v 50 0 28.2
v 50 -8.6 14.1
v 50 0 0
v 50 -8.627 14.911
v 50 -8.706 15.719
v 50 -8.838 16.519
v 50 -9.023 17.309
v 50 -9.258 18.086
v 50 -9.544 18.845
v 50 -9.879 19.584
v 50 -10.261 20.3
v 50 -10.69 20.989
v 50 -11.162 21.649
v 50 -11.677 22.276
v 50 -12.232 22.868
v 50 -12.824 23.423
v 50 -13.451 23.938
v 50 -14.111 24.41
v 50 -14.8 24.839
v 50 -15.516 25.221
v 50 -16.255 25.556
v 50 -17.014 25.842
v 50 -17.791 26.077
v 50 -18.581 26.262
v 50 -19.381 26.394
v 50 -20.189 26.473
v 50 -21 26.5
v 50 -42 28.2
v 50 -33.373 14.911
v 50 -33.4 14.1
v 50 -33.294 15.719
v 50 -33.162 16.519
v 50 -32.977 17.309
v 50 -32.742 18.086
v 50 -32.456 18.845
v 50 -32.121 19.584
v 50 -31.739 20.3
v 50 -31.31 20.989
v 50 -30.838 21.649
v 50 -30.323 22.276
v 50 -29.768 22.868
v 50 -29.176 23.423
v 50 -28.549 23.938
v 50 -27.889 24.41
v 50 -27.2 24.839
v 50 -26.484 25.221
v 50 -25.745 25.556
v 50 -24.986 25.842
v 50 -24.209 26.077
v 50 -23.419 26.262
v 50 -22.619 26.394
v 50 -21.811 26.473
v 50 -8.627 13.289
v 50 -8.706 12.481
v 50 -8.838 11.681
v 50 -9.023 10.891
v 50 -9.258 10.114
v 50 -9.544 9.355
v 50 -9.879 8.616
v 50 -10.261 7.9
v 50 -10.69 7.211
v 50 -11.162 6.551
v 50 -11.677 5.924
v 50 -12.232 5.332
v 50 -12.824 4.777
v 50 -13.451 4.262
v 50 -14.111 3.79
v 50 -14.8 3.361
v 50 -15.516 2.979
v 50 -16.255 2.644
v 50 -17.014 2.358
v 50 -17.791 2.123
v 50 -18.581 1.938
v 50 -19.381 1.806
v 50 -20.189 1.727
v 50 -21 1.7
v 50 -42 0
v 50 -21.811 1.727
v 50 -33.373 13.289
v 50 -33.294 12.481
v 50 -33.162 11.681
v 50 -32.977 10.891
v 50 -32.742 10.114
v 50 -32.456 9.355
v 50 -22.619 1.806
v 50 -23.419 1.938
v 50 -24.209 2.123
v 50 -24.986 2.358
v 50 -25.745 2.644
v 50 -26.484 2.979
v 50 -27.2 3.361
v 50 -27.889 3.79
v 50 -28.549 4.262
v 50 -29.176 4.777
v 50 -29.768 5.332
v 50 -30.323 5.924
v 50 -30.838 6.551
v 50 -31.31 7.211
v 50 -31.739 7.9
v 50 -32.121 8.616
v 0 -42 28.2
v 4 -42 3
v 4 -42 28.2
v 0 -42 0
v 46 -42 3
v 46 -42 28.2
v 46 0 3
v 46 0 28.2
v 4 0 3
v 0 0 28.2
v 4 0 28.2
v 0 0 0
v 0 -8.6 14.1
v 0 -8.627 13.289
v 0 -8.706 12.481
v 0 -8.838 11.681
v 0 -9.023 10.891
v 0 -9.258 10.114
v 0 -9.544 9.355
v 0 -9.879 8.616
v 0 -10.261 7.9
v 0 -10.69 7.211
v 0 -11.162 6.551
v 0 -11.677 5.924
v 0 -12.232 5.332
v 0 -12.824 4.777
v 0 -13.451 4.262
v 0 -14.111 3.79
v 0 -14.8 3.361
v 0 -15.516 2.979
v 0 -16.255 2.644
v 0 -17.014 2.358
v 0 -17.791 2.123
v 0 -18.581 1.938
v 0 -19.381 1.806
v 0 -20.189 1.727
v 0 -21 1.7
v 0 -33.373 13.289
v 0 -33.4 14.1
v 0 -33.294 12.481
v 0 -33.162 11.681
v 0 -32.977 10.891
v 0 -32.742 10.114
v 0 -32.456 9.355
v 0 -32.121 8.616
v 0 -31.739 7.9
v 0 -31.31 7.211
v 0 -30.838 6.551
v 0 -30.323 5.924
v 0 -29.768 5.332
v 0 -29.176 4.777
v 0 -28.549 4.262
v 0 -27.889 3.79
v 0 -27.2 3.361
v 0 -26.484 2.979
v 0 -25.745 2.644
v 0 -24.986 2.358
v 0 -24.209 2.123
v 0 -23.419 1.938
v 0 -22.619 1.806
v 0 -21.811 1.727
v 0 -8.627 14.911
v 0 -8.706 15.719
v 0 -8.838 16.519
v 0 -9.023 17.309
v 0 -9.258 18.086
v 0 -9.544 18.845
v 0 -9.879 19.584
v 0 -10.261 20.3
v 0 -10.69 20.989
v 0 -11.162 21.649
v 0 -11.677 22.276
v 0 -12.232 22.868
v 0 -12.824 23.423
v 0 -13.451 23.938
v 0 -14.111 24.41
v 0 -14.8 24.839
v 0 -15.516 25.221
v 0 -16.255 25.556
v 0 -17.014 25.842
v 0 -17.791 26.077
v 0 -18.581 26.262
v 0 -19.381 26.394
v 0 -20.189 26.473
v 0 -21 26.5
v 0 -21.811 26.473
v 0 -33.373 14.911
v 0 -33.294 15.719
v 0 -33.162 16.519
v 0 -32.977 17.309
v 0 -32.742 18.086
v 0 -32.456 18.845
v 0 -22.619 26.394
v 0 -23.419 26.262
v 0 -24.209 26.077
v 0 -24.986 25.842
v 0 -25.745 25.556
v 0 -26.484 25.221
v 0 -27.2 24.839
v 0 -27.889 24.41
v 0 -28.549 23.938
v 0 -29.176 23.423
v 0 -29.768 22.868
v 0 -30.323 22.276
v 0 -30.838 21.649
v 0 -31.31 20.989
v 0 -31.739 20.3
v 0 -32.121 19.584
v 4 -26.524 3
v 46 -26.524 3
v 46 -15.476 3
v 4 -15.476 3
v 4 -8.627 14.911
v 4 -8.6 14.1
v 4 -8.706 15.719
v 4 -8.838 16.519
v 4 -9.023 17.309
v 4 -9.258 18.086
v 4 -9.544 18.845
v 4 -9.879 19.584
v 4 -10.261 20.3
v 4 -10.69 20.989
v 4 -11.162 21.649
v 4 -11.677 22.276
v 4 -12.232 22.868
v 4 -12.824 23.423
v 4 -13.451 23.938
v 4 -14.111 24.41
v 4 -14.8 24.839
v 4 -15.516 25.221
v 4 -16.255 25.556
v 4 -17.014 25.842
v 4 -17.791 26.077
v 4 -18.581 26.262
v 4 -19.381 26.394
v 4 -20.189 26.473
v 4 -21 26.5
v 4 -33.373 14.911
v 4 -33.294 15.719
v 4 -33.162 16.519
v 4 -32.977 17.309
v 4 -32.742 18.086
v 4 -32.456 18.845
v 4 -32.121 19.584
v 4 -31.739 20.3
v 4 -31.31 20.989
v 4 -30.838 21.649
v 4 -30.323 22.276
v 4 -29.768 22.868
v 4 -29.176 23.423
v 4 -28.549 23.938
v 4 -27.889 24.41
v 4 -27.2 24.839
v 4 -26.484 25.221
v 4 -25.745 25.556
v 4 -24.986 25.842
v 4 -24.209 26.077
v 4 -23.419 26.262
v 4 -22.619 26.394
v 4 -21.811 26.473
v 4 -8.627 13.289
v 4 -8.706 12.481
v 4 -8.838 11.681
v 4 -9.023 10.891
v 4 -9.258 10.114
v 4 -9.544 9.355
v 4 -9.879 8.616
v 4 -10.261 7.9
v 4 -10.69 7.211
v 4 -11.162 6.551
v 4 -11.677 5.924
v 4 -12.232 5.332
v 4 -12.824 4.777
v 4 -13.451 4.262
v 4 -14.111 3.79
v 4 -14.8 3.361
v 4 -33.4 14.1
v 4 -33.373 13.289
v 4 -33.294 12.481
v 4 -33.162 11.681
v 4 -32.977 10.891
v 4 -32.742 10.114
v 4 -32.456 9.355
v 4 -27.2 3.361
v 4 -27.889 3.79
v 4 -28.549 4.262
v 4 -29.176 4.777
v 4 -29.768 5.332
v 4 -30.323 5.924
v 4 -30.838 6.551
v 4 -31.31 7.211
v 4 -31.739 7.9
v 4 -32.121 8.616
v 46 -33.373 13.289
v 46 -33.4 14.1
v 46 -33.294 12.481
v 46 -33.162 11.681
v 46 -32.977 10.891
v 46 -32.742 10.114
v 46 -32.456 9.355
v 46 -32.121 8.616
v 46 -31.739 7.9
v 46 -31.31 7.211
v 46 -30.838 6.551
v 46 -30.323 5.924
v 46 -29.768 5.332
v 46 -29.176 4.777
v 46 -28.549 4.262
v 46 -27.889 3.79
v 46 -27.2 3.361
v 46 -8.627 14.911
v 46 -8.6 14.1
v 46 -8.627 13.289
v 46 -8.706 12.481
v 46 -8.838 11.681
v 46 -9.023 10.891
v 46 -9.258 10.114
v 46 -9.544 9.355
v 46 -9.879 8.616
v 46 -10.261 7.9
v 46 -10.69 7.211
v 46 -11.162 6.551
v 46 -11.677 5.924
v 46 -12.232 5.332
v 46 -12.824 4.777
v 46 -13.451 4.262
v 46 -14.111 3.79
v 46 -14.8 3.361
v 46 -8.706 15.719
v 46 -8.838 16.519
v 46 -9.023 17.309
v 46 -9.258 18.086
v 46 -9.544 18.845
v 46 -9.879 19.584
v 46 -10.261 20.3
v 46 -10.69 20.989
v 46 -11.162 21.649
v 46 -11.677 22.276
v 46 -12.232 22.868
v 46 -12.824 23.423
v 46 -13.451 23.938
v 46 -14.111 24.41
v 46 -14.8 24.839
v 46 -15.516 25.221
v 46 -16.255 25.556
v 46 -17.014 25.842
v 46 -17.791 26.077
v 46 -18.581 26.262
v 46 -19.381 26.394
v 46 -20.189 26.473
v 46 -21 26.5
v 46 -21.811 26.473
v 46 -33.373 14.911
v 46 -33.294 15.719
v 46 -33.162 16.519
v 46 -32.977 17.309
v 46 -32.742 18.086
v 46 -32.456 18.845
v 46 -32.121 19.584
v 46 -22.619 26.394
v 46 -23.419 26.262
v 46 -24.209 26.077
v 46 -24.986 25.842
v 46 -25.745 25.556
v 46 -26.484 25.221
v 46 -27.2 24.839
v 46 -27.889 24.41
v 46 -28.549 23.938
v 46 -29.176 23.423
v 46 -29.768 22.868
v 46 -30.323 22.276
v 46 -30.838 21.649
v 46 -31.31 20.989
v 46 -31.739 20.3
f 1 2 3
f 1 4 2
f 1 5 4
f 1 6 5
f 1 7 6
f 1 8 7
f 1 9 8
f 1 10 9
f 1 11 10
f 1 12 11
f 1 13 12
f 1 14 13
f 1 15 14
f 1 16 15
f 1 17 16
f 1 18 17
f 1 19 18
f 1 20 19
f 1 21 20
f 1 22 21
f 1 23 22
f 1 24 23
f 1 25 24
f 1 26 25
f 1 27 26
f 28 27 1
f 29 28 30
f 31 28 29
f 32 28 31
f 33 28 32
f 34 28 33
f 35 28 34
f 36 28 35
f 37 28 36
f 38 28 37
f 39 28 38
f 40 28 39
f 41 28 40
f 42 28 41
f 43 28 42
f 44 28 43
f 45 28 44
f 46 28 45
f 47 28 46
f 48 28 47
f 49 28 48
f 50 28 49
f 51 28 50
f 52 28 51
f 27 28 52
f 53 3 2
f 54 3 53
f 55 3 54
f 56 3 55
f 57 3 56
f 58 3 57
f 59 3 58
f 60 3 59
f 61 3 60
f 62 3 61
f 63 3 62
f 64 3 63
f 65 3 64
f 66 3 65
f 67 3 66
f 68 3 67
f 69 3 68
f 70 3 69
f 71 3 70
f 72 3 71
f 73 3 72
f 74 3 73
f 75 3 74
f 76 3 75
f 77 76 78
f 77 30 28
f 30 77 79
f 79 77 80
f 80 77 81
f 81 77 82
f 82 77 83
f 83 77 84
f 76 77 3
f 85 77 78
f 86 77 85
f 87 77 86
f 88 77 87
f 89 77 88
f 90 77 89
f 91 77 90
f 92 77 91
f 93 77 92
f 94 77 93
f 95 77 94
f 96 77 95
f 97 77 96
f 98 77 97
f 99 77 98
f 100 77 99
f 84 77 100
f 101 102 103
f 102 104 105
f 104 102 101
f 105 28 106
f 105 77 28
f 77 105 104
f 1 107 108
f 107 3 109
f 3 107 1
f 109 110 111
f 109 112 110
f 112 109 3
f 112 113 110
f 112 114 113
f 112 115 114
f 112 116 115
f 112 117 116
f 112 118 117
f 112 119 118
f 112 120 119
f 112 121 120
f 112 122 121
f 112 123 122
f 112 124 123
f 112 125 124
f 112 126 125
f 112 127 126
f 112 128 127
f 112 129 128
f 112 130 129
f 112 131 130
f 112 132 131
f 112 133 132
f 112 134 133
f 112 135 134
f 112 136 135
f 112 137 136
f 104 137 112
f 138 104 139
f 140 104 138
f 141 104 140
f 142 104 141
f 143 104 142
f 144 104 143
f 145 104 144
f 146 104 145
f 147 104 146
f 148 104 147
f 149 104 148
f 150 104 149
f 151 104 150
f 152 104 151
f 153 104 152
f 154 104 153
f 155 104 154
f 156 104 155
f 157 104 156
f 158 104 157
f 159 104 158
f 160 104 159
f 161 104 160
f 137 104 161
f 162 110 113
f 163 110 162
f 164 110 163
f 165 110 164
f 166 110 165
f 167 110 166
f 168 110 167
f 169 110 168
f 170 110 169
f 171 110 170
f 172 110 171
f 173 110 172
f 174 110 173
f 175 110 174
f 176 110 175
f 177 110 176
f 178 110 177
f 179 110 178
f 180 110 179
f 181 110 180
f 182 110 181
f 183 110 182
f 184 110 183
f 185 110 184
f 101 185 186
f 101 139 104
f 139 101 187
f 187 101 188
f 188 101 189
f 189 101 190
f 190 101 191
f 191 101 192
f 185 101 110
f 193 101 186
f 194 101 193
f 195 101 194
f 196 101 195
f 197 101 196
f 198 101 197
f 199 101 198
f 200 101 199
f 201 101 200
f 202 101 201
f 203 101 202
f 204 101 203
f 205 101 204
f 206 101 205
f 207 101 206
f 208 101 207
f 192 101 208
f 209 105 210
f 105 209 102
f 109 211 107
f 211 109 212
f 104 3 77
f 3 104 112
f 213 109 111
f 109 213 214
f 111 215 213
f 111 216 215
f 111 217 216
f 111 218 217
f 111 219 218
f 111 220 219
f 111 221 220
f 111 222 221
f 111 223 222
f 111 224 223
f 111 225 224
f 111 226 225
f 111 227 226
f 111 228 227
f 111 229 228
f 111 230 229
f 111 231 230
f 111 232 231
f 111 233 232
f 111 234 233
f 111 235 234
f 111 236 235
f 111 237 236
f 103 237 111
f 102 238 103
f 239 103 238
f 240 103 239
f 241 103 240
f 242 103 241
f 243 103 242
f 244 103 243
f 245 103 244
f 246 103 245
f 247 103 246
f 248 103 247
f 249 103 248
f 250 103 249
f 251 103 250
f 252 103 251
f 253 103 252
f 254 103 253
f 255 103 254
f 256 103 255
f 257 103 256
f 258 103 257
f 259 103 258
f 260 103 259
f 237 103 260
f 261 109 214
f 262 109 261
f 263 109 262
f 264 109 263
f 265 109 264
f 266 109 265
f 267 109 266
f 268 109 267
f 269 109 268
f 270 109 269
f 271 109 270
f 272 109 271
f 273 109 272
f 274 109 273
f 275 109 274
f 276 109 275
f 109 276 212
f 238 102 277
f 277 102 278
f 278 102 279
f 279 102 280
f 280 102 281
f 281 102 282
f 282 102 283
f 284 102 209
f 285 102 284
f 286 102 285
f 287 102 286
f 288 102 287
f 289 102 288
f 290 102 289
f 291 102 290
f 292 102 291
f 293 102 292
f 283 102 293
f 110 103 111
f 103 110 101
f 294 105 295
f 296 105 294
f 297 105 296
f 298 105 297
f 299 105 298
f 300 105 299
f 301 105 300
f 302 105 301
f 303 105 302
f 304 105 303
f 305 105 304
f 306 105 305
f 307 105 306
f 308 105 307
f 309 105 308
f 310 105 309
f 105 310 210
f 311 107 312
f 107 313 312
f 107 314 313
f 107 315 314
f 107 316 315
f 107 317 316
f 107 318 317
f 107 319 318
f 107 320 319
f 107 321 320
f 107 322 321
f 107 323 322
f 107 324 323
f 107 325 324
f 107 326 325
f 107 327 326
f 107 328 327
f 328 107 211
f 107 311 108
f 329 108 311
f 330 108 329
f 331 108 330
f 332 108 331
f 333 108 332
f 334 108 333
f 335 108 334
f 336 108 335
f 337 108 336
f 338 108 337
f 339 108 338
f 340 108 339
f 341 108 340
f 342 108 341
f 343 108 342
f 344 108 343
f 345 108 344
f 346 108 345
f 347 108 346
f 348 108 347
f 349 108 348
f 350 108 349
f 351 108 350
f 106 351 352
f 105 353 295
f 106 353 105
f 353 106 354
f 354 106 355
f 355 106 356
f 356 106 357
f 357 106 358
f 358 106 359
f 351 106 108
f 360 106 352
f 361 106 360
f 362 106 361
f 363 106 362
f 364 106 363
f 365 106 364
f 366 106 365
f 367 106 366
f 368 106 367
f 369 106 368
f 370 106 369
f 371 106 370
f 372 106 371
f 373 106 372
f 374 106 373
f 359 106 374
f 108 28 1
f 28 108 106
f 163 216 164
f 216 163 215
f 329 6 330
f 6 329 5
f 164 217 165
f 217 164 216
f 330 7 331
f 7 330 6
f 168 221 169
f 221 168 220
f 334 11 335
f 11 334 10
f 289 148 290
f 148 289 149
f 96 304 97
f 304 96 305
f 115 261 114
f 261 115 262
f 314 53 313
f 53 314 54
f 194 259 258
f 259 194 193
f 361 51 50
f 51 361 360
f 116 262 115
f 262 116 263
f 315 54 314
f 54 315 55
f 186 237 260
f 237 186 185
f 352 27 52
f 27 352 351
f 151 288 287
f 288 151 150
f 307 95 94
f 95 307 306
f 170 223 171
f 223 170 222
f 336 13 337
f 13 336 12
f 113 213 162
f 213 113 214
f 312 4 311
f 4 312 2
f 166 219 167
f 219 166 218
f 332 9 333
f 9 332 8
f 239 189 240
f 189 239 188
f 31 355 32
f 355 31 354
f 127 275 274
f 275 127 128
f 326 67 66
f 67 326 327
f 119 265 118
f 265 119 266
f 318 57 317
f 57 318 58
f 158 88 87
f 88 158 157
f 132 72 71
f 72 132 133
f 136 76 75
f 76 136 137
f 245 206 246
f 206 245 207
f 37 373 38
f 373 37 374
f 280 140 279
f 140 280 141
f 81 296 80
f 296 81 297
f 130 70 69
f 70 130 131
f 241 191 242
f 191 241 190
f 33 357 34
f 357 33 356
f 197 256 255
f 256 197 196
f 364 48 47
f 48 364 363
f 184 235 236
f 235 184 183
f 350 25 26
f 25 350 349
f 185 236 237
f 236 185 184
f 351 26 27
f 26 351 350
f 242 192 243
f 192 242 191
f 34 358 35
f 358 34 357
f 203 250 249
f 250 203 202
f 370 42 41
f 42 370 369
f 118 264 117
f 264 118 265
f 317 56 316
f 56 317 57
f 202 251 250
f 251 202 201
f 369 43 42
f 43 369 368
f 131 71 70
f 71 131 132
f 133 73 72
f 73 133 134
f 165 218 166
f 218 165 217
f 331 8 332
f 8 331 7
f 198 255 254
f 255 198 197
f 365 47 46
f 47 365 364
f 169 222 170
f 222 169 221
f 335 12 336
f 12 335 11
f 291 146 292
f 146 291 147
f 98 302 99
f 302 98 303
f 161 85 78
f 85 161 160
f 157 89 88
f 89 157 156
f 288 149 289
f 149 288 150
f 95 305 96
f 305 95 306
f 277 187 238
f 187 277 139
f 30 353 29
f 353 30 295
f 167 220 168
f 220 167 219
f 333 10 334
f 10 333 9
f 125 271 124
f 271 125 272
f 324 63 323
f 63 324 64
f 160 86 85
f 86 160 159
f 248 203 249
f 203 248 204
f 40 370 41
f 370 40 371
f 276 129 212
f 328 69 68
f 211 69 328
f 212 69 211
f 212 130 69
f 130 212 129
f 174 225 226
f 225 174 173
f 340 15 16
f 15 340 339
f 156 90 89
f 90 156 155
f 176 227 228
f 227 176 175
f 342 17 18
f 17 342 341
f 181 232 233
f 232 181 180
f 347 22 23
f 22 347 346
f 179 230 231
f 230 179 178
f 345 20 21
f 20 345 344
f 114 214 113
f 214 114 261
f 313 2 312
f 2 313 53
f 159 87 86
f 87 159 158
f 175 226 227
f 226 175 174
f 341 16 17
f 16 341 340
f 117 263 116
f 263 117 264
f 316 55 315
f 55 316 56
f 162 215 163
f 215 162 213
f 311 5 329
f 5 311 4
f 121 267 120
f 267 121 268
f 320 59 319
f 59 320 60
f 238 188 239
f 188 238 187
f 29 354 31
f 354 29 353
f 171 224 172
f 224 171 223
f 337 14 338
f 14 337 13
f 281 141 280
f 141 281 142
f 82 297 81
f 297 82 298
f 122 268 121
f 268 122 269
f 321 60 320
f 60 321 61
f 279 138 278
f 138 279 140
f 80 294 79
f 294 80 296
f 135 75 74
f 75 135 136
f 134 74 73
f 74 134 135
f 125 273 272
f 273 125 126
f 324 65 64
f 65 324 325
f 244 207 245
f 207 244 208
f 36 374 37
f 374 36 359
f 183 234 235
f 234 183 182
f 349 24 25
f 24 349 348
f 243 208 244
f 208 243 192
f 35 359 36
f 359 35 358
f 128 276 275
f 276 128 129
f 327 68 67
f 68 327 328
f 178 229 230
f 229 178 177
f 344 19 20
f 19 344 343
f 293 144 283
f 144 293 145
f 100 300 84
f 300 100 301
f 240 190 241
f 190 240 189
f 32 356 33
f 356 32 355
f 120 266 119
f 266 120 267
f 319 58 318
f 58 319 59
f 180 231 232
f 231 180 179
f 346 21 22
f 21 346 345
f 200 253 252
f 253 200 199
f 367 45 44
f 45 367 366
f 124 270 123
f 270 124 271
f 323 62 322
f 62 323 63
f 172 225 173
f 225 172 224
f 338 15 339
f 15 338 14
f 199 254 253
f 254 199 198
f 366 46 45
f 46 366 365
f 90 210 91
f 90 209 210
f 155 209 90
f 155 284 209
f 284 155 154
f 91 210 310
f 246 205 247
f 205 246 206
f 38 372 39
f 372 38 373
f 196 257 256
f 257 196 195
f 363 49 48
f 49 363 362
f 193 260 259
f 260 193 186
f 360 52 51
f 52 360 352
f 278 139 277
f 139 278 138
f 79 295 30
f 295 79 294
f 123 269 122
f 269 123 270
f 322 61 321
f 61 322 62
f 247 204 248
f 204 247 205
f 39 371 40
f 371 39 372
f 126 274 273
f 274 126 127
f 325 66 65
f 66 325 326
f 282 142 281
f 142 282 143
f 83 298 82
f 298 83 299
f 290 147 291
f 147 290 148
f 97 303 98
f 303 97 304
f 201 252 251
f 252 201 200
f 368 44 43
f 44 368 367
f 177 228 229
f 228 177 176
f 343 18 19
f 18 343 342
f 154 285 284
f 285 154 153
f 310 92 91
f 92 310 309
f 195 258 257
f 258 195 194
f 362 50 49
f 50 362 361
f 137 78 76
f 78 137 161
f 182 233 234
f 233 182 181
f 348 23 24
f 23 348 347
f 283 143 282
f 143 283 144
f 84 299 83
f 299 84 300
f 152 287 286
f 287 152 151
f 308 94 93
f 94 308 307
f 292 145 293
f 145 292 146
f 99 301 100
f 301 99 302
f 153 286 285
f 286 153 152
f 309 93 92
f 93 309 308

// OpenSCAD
$fn = 96;

// Toggle the default view.
show_assembly = false;
show_print_layout = false;
show_base_only = false;
show_body_only = false;
show_cover_only = false;
show_roller_only = false;
show_roller_holder_short_only = true;

// Candy and printer assumptions.
candy_d = 15;
fit_clearance = 0.25;          // Friction-fit clearance per side for the cover plug.
rotating_clearance = 0.40;     // Radial running clearance around the roller.

// Overall envelope.
overall_w = 50;
overall_h = 200;

// Major parts.
base_t = 22;
cover_t = 8;
body_h = overall_h - base_t - cover_t;

// Body.
side_t = 4;
back_t = 3;
front_glue_land = 0;
body_w = overall_w;
roller_d = 24;
roller_r = roller_d / 2;
roller_gap_wall = 0.60;        // Gap from roller OD to back wall / future acrylic.
channel_d = roller_d + 2 * roller_gap_wall;
body_d = back_t + channel_d + front_glue_land;
inner_w = body_w - 2 * side_t;
acrylic_plane_y = body_d;

// Roller and scoop.
roller_handle_extension = 14;
roller_len = body_w + 2 * roller_handle_extension;
roller_hole_d = roller_d + 2 * rotating_clearance;
scoop_d = 16.5;
scoop_len = inner_w - 15.0;
scoop_center_lift = 4.5;       // Offsets the scoop upward to avoid a paper-thin shell.

// Vertical placement.
body_z = base_t;
roller_z = 150;
roller_y = body_d / 2;

// Slides.
slide_count = 5;
slide_t = 3;
slide_depth = channel_d - 2.0;
slide_margin = 8;
slide_length_scale = 0.9;
slide_run = (inner_w - slide_margin) * slide_length_scale;
slide_angle = 22;
slide_drop = slide_run * sin(slide_angle);
roller_to_slide_gap = 15;
slide_step_z = 21;
top_slide_high_z = (roller_z - roller_r - body_z) - roller_to_slide_gap - slide_t;
slide_anchor_z = [for (i = [0 : slide_count - 1]) top_slide_high_z - i * slide_step_z];

// Roller-holder-short part. This keeps the top body section with the roller
// through-hole centered vertically in the cropped printable part.
roller_holder_short_top_clearance = (body_h - (roller_z - body_z)) / 2;
roller_holder_short_roller_z = roller_holder_short_top_clearance;
roller_holder_short_h = 2 * roller_holder_short_top_clearance;

// Fifth slide discharge point. The last slide is the left slide, so candy exits near the right side.
last_slide_end_x = (side_t - 0.4) + slide_run * cos(slide_angle);

// Base.
base_front_margin = 30;
base_d = body_d + base_front_margin;
trough_w = overall_w - 2 * side_t - 4;
trough_l = 50;
trough_point_z = base_t - 15;
trough_x = (overall_w - trough_w) / 2;

// Cover plug.
cover_plug_h = 12;
cover_plug_w = inner_w - 2 * fit_clearance;
cover_plug_d = channel_d - 2 * fit_clearance;

module trough_prism_origin() {
    // Maps local polygon/extrude axes [u, v, w] to global [x, y, z] = [w, u, v].
    // That gives an X-axis prism from a Y-Z triangle.
    multmatrix([
        [0, 0, 1, 0],
        [1, 0, 0, 0],
        [0, 1, 0, 0],
        [0, 0, 0, 1]
    ])
        linear_extrude(height = trough_w)
        polygon(points = [
            [0, trough_point_z],
            [0, base_t],
            [trough_l, base_t]
        ]);
}

module base_plate() {
    color([0.96, 0.64, 0.05])
    difference() {
        cube([overall_w, base_d, base_t]);
        translate([trough_x, 0, 2])
            translate([trough_w / 2, trough_l / 2, (trough_point_z + base_t) / 2])
            rotate([180, 180, 0])
            translate([-trough_w / 2, -trough_l / 2, -(trough_point_z + base_t) / 2])
            trough_prism_origin();
    }
}

module cover_plate() {
    color([0.96, 0.64, 0.05])
    union() {
        cube([overall_w, body_d, cover_t]);

        // One-piece friction plug. 0.20 mm per side is a sane FDM starting point.
        translate([(overall_w - cover_plug_w) / 2,
                   back_t + fit_clearance,
                   -cover_plug_h])
            cube([cover_plug_w, cover_plug_d, cover_plug_h]);
    }
}

module left_slide(anchor_z) {
    translate([side_t - 0.4, back_t + 1.0, anchor_z])
        rotate([0, slide_angle, 0])
        cube([slide_run, slide_depth, slide_t]);
}

module right_slide(anchor_z) {
    translate([body_w - side_t + 0.4, back_t + 1.0, anchor_z])
        rotate([0, -slide_angle, 0])
        translate([-slide_run, 0, 0])
        cube([slide_run, slide_depth, slide_t]);
}

module body_part() {
    color([0.74, 0.74, 0.76])
    difference() {
        union() {
            cube([body_w, back_t, body_h]);
            cube([side_t, body_d, body_h]);
            translate([body_w - side_t, 0, 0])
                cube([side_t, body_d, body_h]);

            for (i = [0 : slide_count - 1]) {
                if (i % 2 == 0) {
                    left_slide(slide_anchor_z[i]);
                } else {
                    right_slide(slide_anchor_z[i]);
                }
            }
        }

        // Circular through-holes that the roller snaps into.
        translate([-1, roller_y, roller_z - body_z])
            rotate([0, 90, 0])
            cylinder(d = roller_hole_d, h = body_w + 2, center = false);
    }
}

module roller_holder_short_part() {
    color([0.74, 0.74, 0.76])
    difference() {
        union() {
            cube([body_w, back_t, roller_holder_short_h]);
            cube([side_t, body_d, roller_holder_short_h]);
            translate([body_w - side_t, 0, 0])
                cube([side_t, body_d, roller_holder_short_h]);
        }

        // Same roller clearance as the full body, shifted into this cropped part.
        translate([-1, roller_y, roller_holder_short_roller_z])
            rotate([0, 90, 0])
            cylinder(d = roller_hole_d, h = body_w + 2, center = false);
    }
}

module roller_part() {
    color([0.95, 0.68, 0.08])
    difference() {
        rotate([0, 90, 0])
            cylinder(d = roller_d, h = roller_len, center = true);

        // Single scoop sized for one 15 mm candy.
        translate([0, 0, scoop_center_lift])
            rotate([0, 90, 0])
            cylinder(d = scoop_d, h = scoop_len, center = true);
    }
}

module assembly_view() {
    translate([0, 0, 0])
        base_plate();

    translate([0, 0, body_z])
        body_part();

    translate([body_w / 2, roller_y, roller_z])
        roller_part();

    translate([0, 0, overall_h - cover_t])
        cover_plate();
}

module print_layout_view(spacing = 10) {
    // Base
    translate([0, 0, 0])
        base_plate();

    // Body printed on the back wall.
    translate([overall_w + spacing, 0, 0])
        rotate([90, 0, 0])
        body_part();

    // Cover
    translate([overall_w + body_h + 2 * spacing, 0, 0])
        cover_plate();

    // Roller
    translate([overall_w + body_h + overall_w + 3 * spacing, roller_r + 2, 0])
        rotate([90, 0, 0])
        roller_part();

    // Roller-holder-short, printed on the back wall like the full body.
    translate([overall_w + body_h + overall_w + roller_len + 4 * spacing, 0, 0])
        rotate([90, 0, 0])
        roller_holder_short_part();
}

if (show_base_only) {
    base_plate();
} else if (show_body_only) {
    body_part();
} else if (show_cover_only) {
    cover_plate();
} else if (show_roller_only) {
    roller_part();
} else if (show_roller_holder_short_only) {
    rotate([90, 0, 0])
        roller_holder_short_part();
} else if (show_assembly) {
    assembly_view();
} else if (show_print_layout) {
    print_layout_view();
}
